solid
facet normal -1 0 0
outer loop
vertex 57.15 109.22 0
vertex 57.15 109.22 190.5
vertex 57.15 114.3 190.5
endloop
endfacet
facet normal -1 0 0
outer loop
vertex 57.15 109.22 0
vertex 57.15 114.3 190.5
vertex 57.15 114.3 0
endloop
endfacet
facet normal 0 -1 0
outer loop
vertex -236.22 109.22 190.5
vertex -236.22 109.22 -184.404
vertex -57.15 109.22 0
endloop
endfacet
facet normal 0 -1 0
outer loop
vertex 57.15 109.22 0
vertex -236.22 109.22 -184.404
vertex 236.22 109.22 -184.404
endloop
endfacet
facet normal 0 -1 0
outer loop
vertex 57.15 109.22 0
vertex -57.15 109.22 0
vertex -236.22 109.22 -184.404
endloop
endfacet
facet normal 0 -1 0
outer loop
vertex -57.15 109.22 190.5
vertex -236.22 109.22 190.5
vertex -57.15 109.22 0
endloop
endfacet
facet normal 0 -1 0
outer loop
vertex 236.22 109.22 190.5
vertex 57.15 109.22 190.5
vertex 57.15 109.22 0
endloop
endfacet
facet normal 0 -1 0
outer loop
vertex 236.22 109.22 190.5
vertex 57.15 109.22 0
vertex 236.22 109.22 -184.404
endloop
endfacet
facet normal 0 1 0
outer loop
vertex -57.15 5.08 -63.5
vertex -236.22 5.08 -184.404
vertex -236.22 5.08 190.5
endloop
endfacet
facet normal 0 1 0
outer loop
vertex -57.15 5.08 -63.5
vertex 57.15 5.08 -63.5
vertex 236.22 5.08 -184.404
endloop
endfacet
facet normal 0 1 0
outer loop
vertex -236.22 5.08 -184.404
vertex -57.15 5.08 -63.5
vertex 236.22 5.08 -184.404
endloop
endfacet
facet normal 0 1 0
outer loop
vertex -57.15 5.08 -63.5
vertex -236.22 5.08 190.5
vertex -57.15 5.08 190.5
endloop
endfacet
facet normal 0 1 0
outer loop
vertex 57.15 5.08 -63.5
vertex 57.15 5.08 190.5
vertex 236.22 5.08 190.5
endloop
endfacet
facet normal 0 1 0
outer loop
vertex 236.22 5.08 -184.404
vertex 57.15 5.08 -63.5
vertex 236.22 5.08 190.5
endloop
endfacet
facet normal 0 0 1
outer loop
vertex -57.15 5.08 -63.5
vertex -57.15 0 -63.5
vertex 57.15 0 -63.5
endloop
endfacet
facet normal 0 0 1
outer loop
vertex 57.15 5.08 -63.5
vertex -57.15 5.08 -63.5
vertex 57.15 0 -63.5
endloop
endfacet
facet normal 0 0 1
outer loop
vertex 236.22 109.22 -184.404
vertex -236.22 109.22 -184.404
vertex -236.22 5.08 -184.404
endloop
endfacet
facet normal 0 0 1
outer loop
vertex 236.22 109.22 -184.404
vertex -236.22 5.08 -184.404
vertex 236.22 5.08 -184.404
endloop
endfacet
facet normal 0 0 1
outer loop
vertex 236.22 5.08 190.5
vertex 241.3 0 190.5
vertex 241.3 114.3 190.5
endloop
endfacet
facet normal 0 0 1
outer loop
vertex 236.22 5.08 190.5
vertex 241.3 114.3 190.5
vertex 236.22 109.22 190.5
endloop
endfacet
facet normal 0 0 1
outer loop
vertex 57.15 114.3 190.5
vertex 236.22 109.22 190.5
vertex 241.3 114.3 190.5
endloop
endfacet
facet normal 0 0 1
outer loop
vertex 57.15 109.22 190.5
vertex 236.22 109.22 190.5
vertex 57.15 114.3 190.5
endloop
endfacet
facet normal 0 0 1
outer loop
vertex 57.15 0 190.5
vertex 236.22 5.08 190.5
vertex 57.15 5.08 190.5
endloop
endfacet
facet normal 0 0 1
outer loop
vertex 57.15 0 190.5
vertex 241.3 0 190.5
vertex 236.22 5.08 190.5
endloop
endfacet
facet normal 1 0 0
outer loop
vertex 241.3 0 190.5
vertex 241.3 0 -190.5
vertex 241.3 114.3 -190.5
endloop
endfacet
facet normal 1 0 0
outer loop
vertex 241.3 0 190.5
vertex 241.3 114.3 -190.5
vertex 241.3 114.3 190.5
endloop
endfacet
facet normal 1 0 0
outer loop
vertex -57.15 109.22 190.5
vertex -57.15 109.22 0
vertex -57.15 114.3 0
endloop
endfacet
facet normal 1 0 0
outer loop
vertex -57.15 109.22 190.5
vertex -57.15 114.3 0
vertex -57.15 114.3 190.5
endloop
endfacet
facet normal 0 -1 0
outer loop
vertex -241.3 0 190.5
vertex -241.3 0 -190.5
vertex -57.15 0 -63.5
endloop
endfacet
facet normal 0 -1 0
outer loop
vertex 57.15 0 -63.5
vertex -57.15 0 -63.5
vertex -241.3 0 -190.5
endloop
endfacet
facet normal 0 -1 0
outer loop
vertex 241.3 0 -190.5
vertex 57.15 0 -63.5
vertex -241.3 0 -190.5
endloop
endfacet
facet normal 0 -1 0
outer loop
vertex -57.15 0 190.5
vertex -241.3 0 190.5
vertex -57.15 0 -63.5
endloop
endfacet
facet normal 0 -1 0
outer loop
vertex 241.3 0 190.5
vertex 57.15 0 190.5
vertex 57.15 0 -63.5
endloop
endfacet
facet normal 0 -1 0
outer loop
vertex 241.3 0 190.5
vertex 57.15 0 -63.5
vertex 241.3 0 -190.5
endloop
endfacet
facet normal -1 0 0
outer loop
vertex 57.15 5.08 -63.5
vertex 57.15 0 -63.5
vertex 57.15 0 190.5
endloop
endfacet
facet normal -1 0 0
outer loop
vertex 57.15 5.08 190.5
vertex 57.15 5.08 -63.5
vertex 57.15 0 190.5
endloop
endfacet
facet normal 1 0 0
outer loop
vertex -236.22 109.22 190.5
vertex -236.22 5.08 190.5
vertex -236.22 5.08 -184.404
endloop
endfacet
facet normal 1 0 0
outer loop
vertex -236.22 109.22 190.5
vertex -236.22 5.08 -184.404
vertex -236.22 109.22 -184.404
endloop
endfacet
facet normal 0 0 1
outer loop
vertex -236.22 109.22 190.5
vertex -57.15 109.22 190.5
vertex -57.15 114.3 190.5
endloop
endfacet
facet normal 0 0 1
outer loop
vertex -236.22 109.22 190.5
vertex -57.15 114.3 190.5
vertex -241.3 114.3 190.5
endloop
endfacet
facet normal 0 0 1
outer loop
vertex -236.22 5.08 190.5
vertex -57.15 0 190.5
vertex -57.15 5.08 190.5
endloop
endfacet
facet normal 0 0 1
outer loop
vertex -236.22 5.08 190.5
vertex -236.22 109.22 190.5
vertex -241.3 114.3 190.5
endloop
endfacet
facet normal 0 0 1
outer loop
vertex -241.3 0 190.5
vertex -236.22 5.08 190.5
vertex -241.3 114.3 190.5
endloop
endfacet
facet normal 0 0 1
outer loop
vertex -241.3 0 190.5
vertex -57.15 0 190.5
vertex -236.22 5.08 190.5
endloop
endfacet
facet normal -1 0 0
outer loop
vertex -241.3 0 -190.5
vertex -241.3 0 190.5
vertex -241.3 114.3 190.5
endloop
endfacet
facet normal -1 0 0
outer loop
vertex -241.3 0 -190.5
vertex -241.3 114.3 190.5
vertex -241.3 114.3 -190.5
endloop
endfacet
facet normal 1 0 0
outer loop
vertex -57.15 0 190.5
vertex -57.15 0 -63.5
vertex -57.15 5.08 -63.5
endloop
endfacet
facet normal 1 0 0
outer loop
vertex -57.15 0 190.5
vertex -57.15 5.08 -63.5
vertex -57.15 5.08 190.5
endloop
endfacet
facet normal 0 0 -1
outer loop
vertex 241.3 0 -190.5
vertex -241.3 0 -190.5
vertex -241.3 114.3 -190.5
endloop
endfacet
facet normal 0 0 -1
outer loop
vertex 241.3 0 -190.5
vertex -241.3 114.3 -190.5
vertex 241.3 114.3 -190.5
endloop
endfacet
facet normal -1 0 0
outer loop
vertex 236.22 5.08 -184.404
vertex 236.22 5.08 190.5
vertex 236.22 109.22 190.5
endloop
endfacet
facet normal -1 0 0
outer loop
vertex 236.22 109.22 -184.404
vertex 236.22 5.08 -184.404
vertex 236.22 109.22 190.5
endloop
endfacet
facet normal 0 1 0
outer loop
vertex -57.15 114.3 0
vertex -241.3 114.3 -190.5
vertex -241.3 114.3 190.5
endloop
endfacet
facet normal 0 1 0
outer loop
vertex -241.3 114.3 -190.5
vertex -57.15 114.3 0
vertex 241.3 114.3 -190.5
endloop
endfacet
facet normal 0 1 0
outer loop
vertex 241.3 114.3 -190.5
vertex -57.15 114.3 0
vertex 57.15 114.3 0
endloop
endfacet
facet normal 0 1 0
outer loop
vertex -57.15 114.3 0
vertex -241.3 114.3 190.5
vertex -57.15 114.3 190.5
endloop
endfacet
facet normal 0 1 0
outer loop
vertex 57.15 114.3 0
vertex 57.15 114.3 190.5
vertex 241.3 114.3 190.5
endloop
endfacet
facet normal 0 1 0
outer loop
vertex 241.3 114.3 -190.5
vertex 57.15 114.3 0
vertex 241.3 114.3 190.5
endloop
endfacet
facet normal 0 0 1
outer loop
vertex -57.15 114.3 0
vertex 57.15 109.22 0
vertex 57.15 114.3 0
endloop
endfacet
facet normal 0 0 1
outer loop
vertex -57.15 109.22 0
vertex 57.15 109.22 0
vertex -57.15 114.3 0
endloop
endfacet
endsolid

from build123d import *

# Parameters (mm, degrees)
F1_DEPTH = 114.3
F2_W     = 472.44
F2_H     = 104.14
F3_DEPTH = 374.904
F4_W     = 114.3
F4_H     = 63.5
F5_DEPTH = 25.4


with BuildPart() as f1:
    # F0 (on Front) → F1 (new body)
    with BuildSketch(Plane.XZ):
        Polygon((-241.3, -190.5), (241.3, -190.5), (241.3, 190.5), (57.15, 190.5), (57.15, 0), (-57.15, 0), (-57.15, 190.5), (-241.3, 190.5), align=None)
    extrude(amount=-F1_DEPTH)

    # F2 (on face) → F3 (cut)
    with BuildSketch(Plane.XY.offset(190.5)):
        with Locations((0, 57.15)):
            Rectangle(F2_W, F2_H)
    extrude(amount=-F3_DEPTH, mode=Mode.SUBTRACT)

    # F4 (on face) → F5 (cut)
    with BuildSketch(Plane.XZ):
        with Locations((0, -31.75)):
            Rectangle(F4_W, F4_H)
    extrude(amount=-F5_DEPTH, mode=Mode.SUBTRACT)


solid = f1.part
